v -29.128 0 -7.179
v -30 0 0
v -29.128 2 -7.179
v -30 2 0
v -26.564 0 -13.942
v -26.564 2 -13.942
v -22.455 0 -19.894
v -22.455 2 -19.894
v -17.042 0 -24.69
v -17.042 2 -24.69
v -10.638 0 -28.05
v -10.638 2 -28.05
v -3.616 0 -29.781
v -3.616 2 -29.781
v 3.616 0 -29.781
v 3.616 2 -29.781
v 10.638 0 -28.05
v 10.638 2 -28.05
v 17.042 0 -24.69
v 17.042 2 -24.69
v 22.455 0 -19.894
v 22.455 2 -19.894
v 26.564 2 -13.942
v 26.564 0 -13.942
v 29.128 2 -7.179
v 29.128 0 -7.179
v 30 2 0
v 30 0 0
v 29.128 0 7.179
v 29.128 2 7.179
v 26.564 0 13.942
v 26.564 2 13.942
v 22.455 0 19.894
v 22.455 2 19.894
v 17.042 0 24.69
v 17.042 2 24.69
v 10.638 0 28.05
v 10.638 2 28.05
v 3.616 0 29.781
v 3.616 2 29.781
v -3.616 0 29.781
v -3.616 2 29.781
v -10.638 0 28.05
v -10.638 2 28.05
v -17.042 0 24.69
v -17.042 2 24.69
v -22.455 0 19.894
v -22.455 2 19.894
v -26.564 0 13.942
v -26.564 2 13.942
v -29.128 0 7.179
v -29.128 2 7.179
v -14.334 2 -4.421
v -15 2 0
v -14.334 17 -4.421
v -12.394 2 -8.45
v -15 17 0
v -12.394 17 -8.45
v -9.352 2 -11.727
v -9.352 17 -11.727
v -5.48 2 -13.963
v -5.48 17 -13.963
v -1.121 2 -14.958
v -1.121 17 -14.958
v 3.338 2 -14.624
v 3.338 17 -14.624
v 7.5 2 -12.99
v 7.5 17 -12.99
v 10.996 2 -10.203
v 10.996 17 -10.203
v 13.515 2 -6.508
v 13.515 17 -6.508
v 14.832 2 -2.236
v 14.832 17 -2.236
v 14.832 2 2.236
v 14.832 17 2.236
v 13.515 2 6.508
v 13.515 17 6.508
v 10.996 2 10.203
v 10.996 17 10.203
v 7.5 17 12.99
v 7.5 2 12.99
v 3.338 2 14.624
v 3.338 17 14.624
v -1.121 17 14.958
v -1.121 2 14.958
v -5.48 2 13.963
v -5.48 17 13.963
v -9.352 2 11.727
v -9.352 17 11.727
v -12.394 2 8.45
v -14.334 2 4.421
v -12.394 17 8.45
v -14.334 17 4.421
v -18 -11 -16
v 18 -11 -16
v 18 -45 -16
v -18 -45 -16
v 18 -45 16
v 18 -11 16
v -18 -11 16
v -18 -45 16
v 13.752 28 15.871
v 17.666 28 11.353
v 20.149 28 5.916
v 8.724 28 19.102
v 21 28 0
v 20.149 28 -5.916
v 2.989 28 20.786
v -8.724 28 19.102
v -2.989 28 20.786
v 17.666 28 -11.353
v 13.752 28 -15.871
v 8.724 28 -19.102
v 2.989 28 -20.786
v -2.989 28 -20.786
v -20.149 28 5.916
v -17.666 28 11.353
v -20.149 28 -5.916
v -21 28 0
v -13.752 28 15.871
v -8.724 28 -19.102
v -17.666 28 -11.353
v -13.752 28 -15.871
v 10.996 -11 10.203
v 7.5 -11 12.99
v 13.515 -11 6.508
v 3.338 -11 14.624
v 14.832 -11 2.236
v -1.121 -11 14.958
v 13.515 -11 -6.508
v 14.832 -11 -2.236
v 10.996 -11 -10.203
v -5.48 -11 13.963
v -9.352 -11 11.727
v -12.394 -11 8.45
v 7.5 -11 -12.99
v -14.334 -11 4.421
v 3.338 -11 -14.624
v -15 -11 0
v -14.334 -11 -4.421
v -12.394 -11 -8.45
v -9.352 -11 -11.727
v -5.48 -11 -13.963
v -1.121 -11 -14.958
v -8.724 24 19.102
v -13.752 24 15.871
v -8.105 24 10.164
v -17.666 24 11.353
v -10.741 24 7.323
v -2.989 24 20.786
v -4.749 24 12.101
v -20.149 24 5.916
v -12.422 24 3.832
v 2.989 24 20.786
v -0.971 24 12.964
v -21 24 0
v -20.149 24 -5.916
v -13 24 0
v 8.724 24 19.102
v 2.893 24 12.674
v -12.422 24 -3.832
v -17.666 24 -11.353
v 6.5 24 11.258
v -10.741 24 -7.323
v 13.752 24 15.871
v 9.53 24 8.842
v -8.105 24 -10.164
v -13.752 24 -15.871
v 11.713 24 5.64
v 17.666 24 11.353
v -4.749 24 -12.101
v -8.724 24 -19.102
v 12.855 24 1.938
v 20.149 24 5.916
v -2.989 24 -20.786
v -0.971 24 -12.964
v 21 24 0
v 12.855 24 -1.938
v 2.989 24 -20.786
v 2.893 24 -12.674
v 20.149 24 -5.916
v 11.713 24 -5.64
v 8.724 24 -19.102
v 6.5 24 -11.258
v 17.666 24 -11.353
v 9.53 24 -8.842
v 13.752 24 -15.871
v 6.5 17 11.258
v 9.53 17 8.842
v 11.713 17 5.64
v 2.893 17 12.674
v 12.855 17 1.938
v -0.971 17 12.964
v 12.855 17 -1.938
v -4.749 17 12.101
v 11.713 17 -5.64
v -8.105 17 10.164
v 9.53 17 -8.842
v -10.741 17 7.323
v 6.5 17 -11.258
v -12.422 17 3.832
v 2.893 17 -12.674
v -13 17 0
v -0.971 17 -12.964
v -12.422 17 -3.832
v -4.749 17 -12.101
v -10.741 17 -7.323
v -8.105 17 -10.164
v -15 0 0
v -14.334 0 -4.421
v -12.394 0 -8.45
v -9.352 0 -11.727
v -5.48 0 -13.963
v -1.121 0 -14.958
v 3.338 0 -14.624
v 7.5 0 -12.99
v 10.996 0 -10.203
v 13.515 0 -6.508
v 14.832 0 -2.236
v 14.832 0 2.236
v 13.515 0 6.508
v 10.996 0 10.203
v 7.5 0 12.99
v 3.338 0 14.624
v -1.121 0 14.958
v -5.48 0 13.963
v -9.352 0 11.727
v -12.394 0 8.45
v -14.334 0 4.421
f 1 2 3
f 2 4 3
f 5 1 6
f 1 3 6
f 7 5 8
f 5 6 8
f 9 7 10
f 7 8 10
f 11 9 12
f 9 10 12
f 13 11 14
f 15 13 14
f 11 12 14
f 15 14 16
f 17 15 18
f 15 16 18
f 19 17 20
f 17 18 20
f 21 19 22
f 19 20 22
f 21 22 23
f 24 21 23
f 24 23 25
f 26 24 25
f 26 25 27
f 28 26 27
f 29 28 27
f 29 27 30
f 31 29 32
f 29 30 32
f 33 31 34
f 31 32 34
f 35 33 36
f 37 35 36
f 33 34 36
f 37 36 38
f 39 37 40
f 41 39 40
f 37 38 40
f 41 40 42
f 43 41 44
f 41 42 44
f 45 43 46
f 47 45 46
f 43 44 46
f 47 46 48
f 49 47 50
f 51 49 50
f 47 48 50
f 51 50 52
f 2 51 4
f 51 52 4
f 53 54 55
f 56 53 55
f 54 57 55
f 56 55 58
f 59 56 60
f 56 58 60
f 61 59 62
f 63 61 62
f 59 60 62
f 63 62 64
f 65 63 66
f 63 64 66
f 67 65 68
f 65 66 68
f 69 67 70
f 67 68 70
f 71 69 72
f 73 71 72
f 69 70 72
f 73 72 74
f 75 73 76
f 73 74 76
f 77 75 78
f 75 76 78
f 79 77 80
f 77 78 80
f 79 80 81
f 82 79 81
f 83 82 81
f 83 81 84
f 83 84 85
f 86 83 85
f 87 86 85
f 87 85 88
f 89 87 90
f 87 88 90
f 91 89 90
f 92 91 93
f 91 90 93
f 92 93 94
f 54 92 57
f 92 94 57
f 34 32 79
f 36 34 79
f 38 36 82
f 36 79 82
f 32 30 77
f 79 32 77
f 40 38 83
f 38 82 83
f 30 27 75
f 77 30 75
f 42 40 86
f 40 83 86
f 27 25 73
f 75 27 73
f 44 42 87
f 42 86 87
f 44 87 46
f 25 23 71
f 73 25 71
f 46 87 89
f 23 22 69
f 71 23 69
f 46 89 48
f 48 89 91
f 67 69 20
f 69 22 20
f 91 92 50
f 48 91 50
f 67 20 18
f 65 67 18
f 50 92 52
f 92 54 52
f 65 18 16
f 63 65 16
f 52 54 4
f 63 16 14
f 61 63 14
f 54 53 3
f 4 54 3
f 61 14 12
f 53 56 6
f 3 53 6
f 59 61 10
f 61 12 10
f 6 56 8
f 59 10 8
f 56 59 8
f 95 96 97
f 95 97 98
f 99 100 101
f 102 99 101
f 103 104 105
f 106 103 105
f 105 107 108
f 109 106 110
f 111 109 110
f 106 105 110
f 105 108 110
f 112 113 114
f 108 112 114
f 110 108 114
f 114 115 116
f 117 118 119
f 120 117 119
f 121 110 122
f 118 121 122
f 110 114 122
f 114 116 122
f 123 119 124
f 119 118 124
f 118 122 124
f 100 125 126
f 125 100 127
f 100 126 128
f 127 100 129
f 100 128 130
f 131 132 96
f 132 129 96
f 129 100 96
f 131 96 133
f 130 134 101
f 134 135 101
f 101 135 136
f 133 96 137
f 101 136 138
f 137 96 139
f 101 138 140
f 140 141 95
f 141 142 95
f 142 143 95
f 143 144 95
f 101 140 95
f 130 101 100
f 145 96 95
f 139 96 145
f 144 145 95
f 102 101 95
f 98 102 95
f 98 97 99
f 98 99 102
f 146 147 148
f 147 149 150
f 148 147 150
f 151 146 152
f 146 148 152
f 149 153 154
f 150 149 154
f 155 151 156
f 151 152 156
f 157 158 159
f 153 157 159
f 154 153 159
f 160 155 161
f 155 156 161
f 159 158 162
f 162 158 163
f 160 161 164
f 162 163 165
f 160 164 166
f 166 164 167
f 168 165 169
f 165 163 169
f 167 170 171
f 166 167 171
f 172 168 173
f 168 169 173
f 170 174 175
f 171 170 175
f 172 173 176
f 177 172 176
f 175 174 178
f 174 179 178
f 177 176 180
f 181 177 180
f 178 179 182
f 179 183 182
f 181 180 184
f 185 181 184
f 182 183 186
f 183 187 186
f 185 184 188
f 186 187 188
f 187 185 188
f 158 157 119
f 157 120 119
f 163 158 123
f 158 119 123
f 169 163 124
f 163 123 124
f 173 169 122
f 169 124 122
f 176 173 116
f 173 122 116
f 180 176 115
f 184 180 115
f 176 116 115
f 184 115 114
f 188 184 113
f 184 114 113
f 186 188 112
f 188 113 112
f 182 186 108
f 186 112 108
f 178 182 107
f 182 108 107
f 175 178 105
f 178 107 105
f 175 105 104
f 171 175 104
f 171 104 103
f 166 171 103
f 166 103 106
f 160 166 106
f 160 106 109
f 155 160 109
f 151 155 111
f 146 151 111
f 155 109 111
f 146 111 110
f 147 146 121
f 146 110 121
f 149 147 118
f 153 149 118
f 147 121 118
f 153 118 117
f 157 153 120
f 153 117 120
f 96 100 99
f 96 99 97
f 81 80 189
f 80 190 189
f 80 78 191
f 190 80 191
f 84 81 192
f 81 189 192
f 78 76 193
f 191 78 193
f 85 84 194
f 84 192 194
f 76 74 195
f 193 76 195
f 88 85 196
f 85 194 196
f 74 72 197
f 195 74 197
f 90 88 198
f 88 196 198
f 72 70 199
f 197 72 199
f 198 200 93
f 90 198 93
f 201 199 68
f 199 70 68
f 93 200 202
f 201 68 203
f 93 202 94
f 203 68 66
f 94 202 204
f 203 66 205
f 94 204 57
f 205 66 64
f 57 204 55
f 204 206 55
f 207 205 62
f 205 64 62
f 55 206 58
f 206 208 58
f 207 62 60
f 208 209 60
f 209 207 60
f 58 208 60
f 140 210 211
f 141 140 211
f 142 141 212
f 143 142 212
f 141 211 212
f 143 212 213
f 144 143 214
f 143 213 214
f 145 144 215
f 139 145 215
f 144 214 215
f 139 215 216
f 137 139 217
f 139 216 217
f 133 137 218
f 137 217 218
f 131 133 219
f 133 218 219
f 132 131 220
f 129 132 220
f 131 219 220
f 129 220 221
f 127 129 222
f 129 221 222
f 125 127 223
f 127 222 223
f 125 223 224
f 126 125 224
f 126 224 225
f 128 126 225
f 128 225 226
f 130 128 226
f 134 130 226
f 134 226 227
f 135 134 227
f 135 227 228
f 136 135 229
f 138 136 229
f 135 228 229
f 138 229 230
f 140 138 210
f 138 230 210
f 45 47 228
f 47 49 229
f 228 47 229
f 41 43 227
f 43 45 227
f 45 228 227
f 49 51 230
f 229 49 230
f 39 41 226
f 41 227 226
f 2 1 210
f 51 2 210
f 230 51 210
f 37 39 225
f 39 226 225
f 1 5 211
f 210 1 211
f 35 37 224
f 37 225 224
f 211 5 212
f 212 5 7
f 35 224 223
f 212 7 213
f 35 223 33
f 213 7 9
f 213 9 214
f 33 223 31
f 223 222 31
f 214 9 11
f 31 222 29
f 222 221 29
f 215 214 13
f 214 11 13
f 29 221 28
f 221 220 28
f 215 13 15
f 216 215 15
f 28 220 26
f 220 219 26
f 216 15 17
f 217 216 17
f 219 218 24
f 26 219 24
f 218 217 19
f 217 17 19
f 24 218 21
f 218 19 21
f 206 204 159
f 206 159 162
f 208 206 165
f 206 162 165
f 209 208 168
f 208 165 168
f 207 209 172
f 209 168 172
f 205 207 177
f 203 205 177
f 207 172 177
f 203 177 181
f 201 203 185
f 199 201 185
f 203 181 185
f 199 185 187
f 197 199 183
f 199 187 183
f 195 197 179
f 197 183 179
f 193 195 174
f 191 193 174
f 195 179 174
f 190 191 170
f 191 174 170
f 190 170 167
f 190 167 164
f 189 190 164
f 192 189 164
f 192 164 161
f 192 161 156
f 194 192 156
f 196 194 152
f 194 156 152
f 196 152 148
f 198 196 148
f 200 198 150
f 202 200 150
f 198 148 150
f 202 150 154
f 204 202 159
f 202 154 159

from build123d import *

# Parameters (mm, degrees)
ESQUISSE2_R        = 15
BOSS_EXTRU_1_DEPTH = 11
ESQUISSE3_W        = 36
ESQUISSE3_H        = 32
BOSS_EXTRU_2_DEPTH = 34


with BuildPart() as part:
    # Esquisse1 → Révolution1 (revolve)
    with BuildSketch(Plane.XY, mode=Mode.PRIVATE) as r_volution1_sk:
        Polygon((0, 0), (30, 0), (30, 2), (15, 2), (15, 17), (13, 17), (13, 24), (21, 24), (21, 28), (0, 28), align=None)
    revolve(r_volution1_sk.sketch.rotate(Axis((0, 28, 0), (0, -1, 0)), 180), axis=Axis((0, 28, 0), (0, -1, 0)))

    # Esquisse2 → Boss.-Extru.1 (add)
    with BuildSketch(Plane(origin=(0, 0, 0), x_dir=(-1, 0, 0), z_dir=(0, -1, 0))):
        Circle(ESQUISSE2_R)
    extrude(amount=BOSS_EXTRU_1_DEPTH)

    # Esquisse3 → Boss.-Extru.2 (add)
    with BuildSketch(Plane(origin=(0, -11, 0), x_dir=(-1, 0, 0), z_dir=(0, -1, 0))):
        Rectangle(ESQUISSE3_W, ESQUISSE3_H)
    extrude(amount=BOSS_EXTRU_2_DEPTH)


solid = part.part
